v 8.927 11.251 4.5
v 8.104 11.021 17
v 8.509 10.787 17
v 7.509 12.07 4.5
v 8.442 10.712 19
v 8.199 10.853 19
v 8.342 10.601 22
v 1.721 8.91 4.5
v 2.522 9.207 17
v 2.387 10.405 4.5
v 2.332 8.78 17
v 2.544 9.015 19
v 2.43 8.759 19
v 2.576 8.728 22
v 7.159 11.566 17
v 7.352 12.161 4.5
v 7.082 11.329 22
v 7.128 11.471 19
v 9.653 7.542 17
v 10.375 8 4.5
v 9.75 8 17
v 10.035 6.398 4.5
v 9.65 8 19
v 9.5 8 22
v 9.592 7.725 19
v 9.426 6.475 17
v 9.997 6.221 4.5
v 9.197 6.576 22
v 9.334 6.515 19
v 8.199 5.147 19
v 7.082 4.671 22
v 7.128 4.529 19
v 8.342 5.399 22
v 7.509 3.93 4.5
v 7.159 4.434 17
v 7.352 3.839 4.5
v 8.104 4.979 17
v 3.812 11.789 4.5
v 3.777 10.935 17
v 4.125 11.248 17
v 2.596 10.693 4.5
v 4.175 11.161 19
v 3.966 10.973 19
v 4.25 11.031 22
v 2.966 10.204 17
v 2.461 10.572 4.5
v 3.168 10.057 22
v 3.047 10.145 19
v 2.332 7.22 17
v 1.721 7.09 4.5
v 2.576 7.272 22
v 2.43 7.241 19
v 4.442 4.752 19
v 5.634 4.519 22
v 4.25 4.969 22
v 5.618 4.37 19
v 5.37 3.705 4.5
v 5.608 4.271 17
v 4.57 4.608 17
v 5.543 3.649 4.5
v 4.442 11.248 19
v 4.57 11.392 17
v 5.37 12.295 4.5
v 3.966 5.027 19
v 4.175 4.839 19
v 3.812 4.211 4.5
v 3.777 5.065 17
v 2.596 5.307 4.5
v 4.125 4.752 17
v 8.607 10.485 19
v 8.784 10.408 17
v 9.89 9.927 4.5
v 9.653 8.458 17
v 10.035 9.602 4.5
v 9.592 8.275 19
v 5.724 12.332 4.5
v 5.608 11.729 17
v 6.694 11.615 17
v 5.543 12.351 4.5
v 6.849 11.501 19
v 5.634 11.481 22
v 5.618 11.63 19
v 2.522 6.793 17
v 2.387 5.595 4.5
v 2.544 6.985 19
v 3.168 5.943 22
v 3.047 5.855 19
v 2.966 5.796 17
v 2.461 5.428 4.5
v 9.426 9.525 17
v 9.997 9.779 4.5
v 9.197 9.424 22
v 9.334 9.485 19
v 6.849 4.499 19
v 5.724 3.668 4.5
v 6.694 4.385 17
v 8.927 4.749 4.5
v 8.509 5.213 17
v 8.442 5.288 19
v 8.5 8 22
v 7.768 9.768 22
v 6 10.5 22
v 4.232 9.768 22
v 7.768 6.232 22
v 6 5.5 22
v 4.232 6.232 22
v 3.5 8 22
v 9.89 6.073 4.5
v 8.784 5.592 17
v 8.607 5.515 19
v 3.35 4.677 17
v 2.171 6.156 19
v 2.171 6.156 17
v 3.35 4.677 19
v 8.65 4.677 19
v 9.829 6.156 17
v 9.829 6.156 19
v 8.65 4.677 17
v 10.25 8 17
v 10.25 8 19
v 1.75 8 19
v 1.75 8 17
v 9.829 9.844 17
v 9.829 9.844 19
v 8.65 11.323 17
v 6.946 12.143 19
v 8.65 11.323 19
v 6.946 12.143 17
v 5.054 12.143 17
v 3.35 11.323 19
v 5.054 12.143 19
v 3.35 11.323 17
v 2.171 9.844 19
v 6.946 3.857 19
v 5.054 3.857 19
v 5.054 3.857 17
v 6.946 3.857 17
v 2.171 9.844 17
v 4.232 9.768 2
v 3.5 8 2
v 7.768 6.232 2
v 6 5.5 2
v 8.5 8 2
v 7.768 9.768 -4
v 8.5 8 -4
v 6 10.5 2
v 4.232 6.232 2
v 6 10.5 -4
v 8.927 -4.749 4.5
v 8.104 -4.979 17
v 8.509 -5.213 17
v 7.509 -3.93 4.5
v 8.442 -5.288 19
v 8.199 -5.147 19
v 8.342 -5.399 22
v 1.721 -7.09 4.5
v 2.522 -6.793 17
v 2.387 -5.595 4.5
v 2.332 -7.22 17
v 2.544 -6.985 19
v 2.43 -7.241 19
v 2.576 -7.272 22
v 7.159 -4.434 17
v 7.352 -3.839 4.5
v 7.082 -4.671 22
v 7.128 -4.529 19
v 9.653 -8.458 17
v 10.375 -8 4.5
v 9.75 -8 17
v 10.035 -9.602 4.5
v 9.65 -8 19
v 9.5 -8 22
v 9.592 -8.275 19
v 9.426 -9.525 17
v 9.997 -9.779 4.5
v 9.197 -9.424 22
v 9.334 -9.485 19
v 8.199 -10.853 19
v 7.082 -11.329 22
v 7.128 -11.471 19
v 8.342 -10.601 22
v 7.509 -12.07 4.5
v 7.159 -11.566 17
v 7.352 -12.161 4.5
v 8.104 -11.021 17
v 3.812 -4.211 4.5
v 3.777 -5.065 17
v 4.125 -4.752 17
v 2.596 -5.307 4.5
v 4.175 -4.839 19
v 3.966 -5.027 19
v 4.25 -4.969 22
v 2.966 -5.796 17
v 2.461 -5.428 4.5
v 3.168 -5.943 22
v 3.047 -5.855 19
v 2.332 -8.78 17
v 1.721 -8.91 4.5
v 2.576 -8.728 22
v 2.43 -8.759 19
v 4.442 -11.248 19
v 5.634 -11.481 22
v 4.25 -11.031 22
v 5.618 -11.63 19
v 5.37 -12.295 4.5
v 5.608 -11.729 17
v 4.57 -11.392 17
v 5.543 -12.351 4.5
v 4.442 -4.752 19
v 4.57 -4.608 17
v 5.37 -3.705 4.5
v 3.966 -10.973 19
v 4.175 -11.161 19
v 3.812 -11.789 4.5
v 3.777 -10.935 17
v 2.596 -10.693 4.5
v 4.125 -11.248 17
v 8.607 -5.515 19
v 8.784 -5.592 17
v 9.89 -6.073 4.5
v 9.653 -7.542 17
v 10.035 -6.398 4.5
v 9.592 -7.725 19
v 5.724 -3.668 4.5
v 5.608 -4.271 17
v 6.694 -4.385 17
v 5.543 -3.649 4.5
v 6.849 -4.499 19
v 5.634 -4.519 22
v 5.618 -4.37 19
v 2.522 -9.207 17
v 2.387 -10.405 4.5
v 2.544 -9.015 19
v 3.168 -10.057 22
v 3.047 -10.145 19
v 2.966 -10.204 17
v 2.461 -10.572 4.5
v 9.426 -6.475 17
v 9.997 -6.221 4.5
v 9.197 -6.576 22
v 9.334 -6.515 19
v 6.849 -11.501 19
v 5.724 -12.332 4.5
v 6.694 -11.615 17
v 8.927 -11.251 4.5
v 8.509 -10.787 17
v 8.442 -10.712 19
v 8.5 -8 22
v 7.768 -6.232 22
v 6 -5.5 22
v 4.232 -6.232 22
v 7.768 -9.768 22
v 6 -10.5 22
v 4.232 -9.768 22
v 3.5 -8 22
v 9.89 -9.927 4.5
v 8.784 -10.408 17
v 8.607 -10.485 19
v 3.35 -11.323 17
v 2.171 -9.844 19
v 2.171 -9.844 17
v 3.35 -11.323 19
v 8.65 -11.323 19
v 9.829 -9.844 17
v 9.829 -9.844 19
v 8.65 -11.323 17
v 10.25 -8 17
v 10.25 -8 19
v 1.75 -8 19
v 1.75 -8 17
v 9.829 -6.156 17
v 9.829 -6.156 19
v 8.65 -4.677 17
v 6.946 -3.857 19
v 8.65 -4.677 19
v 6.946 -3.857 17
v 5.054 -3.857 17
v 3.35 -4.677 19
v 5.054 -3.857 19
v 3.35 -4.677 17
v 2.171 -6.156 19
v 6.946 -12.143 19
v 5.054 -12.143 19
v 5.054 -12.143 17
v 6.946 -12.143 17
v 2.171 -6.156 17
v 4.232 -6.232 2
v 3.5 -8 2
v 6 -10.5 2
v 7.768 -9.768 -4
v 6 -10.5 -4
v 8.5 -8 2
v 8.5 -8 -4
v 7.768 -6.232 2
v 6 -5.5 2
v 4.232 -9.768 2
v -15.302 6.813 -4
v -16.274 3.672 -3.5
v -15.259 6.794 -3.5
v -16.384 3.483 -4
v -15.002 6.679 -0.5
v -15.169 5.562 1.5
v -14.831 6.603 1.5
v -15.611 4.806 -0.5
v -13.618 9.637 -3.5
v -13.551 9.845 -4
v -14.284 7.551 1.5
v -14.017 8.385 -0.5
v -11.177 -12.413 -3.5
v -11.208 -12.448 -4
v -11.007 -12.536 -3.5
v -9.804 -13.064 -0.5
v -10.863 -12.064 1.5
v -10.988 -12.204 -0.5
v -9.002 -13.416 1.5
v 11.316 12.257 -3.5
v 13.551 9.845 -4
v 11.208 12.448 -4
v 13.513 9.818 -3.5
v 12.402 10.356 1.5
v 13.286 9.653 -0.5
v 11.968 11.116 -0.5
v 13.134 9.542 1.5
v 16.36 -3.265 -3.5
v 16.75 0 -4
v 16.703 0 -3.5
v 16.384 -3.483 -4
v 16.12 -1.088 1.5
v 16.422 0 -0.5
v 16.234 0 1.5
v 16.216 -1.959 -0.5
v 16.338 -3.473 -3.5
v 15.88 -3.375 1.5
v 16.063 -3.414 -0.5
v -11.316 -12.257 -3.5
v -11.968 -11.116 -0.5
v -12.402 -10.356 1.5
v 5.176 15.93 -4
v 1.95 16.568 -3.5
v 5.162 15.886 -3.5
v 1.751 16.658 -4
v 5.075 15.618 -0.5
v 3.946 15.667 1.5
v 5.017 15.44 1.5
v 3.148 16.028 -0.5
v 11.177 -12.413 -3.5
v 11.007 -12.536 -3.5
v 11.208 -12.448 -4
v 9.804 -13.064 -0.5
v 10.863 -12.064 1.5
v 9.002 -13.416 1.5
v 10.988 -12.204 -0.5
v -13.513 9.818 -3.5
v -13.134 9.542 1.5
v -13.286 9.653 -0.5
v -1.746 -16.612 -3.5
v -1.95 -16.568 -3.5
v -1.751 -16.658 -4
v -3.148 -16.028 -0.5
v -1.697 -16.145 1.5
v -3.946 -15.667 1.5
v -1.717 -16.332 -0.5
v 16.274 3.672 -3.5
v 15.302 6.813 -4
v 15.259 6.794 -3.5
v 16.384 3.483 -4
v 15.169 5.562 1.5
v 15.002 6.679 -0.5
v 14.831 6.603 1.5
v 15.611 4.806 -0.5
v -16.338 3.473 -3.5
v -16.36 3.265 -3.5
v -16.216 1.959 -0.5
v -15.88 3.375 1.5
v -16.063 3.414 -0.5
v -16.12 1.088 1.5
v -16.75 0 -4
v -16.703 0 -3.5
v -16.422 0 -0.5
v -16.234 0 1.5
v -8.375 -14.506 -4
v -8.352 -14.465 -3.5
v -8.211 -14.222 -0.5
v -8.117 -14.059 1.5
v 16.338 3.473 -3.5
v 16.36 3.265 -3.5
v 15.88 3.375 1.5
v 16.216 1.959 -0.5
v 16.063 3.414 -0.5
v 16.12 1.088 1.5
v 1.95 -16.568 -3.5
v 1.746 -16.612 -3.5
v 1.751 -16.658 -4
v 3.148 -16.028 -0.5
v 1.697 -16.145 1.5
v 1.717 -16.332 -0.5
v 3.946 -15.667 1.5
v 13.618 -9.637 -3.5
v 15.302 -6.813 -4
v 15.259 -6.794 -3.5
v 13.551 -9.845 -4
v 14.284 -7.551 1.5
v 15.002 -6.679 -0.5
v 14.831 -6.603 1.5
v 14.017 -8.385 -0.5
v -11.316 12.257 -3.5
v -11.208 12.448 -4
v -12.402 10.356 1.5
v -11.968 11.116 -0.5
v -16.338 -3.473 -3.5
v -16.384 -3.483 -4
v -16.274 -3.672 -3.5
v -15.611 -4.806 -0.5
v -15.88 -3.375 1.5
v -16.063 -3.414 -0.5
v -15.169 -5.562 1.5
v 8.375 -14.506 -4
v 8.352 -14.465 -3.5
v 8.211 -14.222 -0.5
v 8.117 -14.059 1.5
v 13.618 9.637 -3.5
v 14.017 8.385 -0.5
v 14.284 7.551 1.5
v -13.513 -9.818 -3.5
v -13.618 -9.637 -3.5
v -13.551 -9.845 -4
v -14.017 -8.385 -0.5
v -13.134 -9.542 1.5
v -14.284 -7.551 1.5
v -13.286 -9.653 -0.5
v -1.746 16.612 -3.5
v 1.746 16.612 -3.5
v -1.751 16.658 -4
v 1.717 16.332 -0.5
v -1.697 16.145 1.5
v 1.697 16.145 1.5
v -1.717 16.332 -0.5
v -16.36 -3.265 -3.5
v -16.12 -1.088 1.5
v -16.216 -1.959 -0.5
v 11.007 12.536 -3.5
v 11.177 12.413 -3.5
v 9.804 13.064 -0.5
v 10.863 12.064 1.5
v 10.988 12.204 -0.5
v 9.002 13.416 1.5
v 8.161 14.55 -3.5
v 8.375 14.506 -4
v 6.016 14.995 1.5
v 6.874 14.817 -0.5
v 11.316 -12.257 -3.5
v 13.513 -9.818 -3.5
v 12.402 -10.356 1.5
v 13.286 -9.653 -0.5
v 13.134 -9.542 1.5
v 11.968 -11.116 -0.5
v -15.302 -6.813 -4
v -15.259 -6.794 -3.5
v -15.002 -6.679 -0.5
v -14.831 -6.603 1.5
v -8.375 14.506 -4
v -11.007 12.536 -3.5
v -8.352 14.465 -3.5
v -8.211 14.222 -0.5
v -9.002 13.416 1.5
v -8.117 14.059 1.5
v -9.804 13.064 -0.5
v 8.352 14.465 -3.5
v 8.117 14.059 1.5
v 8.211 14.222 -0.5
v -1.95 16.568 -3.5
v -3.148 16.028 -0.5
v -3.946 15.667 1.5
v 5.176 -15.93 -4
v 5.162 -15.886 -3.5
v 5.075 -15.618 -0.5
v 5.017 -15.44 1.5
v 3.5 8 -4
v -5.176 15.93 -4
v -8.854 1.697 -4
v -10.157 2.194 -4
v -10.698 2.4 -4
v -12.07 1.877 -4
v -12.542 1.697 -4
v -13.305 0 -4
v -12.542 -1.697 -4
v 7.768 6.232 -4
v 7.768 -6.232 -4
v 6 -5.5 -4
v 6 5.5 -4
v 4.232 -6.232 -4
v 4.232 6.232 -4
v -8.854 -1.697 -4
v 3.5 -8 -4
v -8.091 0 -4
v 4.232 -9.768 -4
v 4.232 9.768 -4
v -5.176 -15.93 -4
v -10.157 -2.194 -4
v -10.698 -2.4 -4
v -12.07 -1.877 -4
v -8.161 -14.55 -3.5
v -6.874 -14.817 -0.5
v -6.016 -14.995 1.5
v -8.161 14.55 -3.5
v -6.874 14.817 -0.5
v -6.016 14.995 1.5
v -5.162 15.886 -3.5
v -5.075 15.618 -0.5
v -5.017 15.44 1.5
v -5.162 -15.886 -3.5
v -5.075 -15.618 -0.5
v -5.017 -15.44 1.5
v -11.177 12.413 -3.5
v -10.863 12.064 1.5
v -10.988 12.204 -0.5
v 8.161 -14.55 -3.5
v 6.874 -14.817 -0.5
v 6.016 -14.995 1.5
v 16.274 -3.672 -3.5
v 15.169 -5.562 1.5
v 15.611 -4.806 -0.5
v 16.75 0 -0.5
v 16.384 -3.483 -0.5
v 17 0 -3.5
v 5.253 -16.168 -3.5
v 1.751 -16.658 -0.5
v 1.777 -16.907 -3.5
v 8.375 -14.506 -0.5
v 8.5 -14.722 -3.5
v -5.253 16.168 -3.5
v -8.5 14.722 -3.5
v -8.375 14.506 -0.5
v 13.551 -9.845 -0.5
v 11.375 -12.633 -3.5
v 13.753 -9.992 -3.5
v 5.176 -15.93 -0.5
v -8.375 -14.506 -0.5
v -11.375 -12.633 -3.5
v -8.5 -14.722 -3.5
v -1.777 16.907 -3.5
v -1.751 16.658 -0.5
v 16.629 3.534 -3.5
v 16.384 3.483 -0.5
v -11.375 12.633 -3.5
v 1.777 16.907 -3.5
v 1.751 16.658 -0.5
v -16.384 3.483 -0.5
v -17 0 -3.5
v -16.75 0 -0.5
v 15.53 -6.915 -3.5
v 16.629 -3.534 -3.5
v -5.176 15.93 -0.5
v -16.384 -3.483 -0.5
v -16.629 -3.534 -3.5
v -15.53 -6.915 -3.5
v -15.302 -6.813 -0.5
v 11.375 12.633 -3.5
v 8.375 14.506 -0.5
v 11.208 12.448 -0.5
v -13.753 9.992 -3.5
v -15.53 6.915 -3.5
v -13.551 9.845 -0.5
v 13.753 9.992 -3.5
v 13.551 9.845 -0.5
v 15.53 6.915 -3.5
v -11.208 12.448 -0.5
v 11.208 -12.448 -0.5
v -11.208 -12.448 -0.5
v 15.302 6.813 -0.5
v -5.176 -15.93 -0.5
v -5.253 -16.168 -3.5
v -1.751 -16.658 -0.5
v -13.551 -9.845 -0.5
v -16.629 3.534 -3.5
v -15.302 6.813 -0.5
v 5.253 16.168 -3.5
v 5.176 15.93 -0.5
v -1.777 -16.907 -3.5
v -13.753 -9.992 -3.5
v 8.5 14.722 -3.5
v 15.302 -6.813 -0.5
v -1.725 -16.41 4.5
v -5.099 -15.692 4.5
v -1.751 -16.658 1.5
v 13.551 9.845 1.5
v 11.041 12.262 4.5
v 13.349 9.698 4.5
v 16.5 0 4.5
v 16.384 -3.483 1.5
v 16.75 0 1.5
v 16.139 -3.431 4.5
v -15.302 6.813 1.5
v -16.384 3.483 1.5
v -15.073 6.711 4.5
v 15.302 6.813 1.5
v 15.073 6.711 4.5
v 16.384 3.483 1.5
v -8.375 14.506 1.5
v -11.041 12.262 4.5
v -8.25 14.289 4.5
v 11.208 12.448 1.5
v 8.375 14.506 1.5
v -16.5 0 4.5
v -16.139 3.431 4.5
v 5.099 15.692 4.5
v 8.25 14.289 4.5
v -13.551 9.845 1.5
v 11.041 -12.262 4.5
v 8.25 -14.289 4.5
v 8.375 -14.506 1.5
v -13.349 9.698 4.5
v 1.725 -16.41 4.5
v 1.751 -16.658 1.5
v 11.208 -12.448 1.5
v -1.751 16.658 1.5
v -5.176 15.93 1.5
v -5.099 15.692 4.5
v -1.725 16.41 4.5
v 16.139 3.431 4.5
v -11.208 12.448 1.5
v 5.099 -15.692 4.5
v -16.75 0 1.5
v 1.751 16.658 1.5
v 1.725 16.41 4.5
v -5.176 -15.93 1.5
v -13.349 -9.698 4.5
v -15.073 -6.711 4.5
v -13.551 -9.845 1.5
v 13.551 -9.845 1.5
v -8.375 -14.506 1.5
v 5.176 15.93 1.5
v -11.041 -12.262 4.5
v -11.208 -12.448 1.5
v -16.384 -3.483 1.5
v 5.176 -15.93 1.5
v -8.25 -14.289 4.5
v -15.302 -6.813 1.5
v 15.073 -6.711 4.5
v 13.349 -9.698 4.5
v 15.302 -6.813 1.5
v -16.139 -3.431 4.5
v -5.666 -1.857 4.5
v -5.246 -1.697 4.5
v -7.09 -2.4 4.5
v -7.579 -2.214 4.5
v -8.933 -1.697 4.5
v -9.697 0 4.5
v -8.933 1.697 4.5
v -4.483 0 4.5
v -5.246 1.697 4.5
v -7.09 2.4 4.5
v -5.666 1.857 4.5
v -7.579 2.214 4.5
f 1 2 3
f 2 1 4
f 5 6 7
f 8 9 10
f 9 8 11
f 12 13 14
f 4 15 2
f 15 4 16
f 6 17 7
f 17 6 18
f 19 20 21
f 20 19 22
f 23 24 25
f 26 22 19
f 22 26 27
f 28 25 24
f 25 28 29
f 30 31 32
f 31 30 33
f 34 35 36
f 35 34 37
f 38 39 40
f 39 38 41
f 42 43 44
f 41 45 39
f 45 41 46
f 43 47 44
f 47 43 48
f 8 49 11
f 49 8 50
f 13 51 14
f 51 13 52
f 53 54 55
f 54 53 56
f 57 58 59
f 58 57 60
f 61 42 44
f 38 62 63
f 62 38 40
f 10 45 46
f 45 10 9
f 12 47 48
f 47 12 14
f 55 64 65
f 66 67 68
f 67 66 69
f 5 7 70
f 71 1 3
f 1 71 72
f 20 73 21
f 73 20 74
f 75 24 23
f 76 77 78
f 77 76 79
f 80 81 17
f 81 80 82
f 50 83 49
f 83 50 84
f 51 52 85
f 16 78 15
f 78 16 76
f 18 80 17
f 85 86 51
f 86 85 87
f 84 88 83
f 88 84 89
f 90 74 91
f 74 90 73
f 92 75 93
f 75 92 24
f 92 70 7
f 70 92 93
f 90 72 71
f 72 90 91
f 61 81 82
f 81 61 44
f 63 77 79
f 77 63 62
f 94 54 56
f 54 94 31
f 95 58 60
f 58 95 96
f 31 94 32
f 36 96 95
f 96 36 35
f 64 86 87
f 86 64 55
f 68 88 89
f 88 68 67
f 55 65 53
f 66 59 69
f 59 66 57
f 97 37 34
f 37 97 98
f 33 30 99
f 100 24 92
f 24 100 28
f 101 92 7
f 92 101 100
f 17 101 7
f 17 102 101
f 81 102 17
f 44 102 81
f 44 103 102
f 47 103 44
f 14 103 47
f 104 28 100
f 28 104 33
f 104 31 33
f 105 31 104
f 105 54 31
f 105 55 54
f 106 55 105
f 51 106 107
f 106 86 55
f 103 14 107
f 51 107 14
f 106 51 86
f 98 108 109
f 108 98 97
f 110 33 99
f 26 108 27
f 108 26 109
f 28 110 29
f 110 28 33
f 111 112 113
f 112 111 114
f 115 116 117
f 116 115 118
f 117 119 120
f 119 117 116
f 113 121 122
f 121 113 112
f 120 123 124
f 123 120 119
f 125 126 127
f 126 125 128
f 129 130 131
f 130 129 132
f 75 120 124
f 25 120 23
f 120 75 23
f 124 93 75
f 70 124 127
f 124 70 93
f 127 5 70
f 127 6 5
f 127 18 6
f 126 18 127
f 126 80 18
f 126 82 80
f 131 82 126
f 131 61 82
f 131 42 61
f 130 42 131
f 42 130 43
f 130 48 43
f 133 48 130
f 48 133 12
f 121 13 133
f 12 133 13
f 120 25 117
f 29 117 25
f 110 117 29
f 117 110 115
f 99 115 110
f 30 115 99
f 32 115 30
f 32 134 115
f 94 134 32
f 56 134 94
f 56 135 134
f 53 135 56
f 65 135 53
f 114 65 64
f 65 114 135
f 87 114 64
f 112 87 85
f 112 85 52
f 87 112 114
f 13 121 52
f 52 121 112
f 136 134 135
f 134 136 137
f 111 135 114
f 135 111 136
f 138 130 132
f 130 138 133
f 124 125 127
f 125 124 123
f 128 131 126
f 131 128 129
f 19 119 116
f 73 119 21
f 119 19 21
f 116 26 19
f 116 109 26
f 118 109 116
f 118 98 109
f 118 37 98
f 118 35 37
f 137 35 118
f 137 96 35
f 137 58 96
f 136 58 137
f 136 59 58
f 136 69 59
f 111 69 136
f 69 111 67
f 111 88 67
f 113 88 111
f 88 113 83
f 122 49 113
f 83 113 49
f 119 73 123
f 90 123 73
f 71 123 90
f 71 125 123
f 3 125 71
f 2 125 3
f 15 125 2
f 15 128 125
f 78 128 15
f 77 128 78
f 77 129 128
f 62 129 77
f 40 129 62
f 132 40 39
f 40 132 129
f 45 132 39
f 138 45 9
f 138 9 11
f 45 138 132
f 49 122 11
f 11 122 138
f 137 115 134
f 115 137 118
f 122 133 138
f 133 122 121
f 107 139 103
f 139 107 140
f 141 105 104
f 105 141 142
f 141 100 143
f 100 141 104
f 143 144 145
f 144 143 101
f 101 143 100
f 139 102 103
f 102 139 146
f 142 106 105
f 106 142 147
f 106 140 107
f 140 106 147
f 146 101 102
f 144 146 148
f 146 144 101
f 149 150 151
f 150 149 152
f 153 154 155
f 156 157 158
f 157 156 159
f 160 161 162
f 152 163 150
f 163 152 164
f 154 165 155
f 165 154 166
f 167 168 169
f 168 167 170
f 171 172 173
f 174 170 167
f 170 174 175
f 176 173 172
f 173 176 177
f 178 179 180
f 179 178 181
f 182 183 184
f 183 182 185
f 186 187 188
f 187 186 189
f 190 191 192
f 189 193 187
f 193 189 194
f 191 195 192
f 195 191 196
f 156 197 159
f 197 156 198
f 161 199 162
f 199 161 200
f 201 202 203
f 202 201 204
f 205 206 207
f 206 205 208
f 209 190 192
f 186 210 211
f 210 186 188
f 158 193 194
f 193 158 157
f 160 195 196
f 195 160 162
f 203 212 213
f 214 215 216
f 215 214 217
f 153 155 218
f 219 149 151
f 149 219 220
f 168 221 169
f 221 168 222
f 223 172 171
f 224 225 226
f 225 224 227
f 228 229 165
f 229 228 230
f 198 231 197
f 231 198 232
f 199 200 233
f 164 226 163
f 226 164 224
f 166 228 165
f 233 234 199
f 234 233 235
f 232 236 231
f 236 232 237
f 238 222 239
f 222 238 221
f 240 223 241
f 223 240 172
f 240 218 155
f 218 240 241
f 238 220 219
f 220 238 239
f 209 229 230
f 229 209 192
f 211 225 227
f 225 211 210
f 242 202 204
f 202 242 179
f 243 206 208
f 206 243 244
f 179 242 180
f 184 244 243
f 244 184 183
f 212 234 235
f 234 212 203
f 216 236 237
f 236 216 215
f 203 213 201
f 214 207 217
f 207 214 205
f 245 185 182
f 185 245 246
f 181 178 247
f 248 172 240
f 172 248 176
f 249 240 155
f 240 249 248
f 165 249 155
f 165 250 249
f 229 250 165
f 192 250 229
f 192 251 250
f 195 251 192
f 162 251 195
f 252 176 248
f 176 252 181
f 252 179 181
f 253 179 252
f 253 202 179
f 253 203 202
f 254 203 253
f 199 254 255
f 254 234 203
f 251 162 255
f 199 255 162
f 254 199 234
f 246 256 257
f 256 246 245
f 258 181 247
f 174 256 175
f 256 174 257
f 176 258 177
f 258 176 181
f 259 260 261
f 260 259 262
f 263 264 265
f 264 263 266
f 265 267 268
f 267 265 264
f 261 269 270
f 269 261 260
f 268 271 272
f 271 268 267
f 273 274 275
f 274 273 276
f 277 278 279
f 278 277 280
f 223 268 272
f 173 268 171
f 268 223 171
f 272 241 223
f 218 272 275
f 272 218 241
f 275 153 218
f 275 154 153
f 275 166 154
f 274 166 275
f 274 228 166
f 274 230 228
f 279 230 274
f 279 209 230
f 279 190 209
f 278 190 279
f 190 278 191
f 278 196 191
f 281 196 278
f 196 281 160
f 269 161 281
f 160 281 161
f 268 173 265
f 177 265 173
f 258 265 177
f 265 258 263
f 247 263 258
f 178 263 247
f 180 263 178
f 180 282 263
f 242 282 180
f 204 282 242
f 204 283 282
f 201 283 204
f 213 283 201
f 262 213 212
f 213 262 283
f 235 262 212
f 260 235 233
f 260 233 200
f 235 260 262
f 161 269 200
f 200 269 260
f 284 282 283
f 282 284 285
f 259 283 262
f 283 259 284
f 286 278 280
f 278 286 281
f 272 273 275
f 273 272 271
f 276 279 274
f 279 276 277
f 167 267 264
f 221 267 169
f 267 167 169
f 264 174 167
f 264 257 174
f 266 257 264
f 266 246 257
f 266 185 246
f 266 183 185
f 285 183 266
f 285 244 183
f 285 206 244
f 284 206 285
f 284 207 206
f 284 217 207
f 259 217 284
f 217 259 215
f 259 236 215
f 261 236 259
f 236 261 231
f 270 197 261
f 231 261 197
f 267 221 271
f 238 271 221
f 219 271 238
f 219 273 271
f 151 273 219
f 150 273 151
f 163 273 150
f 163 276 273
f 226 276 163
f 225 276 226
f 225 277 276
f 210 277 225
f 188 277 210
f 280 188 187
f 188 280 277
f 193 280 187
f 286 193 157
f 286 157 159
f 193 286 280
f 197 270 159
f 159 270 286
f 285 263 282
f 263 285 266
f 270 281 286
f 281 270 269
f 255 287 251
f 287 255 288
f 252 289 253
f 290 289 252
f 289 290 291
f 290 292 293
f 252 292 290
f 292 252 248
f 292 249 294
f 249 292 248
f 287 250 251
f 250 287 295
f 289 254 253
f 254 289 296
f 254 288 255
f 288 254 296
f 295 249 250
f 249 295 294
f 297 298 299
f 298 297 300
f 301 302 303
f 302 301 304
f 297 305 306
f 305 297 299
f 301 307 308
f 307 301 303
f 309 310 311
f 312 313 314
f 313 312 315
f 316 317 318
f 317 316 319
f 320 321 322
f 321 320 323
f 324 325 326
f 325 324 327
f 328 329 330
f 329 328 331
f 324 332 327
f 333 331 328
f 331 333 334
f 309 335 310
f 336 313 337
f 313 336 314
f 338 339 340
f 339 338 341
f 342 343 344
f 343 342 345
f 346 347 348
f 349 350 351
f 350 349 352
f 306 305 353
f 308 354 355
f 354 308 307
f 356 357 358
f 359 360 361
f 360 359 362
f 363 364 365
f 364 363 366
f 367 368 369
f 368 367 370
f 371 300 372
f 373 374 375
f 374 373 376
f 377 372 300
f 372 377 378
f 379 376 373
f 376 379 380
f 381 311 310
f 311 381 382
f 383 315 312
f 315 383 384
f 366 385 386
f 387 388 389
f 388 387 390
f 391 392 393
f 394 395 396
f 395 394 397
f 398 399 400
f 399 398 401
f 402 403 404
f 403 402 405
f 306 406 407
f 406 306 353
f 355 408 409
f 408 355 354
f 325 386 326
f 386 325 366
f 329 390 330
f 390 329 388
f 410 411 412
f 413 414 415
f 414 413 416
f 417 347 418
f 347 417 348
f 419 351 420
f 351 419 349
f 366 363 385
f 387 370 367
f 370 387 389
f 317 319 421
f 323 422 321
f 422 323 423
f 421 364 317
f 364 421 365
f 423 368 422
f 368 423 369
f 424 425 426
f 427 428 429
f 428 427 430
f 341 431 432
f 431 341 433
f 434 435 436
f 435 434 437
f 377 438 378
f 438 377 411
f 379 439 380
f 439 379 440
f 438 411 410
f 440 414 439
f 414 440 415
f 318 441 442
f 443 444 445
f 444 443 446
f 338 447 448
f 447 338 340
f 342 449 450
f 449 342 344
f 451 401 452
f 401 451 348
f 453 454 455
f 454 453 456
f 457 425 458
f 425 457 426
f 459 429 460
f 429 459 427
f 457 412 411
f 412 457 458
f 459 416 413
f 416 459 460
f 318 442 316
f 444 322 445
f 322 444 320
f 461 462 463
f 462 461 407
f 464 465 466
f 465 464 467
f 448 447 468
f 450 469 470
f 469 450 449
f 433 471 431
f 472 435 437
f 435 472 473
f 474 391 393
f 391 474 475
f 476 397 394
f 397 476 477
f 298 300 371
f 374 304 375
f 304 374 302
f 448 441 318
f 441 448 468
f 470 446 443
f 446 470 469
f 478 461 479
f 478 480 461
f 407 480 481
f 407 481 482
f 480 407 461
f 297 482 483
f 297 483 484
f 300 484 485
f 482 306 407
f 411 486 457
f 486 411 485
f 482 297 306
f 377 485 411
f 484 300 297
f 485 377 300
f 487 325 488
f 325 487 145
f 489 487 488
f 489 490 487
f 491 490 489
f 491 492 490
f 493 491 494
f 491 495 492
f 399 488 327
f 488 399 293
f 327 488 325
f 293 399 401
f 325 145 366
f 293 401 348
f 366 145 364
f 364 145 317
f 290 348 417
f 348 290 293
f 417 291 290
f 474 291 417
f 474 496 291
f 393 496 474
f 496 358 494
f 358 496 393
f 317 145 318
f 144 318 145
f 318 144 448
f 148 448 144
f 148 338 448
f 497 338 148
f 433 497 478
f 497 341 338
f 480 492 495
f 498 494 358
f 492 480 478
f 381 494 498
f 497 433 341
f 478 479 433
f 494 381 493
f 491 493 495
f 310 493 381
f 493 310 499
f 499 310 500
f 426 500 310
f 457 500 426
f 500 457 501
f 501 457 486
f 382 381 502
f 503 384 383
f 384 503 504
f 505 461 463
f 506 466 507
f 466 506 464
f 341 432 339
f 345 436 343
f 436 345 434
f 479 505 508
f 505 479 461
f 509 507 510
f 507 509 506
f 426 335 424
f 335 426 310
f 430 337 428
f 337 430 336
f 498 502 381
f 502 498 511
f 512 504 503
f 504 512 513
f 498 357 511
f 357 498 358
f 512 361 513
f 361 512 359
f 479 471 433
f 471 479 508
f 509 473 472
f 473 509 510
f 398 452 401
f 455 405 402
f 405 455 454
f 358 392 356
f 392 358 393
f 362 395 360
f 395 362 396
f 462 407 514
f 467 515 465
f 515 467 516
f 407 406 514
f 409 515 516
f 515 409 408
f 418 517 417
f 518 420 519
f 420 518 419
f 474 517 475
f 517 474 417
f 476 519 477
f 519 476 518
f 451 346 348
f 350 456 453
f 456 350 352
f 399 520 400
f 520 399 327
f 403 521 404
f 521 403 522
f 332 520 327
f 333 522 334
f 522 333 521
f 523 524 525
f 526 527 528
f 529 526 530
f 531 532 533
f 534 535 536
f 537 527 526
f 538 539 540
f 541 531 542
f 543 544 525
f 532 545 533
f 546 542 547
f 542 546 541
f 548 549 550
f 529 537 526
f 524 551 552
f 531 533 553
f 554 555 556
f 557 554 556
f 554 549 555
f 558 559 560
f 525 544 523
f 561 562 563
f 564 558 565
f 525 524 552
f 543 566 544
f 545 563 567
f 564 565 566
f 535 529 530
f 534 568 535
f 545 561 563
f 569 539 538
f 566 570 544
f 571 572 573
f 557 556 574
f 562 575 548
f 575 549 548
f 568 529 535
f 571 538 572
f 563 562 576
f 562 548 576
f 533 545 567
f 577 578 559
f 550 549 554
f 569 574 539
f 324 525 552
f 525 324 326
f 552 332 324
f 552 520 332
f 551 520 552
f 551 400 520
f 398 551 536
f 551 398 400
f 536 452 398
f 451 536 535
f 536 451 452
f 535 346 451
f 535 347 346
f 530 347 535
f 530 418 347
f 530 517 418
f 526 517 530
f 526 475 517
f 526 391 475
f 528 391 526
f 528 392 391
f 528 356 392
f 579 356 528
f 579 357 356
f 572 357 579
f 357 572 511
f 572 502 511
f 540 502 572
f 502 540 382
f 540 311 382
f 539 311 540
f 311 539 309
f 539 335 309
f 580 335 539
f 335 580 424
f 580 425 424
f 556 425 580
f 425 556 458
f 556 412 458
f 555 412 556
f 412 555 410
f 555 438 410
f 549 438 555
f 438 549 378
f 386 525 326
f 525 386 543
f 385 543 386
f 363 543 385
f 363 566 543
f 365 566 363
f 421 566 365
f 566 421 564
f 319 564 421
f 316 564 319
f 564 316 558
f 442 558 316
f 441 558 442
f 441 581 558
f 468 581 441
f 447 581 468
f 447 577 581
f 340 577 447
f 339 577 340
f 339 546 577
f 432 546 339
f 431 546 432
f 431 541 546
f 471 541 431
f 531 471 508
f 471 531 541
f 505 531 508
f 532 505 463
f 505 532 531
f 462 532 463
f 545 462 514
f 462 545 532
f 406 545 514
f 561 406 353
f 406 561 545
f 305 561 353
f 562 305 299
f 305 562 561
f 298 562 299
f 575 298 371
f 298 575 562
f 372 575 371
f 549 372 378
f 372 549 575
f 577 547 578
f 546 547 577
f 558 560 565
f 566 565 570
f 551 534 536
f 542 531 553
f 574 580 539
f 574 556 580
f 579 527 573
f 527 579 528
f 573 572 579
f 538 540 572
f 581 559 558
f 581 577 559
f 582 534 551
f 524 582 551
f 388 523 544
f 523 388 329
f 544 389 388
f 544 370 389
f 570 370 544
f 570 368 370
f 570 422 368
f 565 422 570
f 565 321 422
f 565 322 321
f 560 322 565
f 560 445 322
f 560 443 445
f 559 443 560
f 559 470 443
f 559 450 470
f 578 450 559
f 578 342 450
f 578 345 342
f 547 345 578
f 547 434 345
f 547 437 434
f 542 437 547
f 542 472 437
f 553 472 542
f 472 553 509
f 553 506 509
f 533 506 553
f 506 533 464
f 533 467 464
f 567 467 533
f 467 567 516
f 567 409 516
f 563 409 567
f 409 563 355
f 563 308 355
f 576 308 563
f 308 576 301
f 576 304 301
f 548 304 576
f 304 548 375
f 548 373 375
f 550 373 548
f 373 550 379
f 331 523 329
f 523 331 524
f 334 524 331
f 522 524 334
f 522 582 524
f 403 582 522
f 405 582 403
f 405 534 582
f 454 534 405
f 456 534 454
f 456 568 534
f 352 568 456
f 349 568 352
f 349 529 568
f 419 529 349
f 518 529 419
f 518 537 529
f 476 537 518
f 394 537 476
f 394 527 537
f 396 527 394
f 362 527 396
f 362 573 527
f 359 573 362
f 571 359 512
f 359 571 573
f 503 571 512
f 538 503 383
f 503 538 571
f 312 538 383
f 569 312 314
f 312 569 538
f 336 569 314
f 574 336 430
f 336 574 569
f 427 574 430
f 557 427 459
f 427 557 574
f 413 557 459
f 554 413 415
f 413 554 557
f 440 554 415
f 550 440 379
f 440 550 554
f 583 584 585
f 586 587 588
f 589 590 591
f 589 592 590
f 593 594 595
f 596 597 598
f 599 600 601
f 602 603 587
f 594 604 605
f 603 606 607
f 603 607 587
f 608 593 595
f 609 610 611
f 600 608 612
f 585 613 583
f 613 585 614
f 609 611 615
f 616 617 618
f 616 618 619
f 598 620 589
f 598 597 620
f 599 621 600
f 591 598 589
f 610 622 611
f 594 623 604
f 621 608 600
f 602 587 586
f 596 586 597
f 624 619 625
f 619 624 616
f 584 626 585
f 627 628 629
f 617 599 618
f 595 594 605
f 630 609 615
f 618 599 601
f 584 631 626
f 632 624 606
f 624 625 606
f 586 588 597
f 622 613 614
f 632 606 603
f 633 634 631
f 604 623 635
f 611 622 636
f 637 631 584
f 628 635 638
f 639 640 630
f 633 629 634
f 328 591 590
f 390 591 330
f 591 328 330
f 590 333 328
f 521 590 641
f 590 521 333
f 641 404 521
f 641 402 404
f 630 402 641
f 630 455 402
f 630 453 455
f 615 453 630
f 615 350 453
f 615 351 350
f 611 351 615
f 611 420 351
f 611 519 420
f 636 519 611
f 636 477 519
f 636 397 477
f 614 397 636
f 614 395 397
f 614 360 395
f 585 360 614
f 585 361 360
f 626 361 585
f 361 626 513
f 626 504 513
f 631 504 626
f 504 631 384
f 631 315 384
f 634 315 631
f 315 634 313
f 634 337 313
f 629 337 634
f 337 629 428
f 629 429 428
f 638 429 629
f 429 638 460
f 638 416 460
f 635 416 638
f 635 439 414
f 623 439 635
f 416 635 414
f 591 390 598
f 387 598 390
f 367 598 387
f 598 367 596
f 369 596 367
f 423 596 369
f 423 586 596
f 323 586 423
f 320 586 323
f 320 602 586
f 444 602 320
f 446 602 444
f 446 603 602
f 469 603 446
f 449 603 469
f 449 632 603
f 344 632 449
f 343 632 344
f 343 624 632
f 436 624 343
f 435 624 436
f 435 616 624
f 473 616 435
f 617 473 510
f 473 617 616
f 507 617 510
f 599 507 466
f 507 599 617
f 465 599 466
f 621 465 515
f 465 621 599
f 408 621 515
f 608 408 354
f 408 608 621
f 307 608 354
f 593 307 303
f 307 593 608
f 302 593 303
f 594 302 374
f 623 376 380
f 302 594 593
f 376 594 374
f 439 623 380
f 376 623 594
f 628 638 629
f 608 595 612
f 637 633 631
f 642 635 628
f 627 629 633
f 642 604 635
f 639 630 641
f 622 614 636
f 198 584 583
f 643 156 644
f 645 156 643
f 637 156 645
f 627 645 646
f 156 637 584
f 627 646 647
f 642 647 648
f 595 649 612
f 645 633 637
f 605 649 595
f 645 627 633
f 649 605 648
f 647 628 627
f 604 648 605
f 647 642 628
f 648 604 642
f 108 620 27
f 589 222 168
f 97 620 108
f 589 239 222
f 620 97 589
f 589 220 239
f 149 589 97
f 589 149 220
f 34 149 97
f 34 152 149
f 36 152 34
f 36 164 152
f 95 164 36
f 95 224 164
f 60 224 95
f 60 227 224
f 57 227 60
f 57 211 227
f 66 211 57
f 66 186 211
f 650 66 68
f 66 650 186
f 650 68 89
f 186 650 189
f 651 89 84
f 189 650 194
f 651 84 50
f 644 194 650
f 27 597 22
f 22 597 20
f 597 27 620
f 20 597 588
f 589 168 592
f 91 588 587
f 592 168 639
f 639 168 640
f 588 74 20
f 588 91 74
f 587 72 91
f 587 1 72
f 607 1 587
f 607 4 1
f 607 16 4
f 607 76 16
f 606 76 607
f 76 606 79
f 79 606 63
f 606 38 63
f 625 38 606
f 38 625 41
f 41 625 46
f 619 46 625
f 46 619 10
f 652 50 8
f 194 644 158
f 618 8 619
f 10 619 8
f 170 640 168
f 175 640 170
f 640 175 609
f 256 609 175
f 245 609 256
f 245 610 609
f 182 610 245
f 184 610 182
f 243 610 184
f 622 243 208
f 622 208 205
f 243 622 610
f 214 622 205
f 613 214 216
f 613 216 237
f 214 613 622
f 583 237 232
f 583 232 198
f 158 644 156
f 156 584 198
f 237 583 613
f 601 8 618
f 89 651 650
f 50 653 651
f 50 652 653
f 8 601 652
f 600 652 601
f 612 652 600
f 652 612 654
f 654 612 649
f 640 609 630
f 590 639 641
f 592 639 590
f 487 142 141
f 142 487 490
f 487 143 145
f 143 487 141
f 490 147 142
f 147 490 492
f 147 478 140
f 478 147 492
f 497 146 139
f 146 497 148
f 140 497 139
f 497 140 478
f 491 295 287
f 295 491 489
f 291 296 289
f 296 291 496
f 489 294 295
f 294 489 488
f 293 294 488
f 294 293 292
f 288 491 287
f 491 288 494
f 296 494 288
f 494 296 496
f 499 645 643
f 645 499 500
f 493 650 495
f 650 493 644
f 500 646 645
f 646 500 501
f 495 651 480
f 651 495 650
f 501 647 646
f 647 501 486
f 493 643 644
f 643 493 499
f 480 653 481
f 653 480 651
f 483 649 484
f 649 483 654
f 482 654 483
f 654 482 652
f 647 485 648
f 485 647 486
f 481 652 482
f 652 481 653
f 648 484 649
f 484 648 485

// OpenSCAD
ventradius = 2.4;
fillradius = 2.5;

module base(size) {
	cylinder(r1=size-0.5, r2=size+0.25, h=8, center=true);
	translate([0,0,2])
            cylinder(r2=size+0.5,r1=size+0.25, h=3, center=true);
	translate([0,0,-3])
            cylinder(r2=size+0.25,r1=size, h=3, center=true);
}

module tube(outer,inner,length) {
  difference() {
   union() {
	cylinder(r1=outer,r2=outer+1,h=length,center=true);
  translate([0,0,4-length/2])
     cylinder(r=outer+0.75,h=2,center=true);
   }
	cylinder(r=inner,h=length+2,center=true);
  }

}
module septa() {
translate([6,-8,-12])tube(3.5,fillradius,20);
translate([6,8,-12]) tube(3.5,fillradius,20);

difference() {
	base(16.5);
	translate([6,-8,0])
           cylinder(r=fillradius,h=20,center=true);
	translate([6,8,0])
           cylinder(r=fillradius,h=20,center=true);
	translate([-9,0,0])
	    rotate([0,-23,0])
           cylinder(r=ventradius,h=20,center=true);
}
}

rotate([180,0,0]) septa();
